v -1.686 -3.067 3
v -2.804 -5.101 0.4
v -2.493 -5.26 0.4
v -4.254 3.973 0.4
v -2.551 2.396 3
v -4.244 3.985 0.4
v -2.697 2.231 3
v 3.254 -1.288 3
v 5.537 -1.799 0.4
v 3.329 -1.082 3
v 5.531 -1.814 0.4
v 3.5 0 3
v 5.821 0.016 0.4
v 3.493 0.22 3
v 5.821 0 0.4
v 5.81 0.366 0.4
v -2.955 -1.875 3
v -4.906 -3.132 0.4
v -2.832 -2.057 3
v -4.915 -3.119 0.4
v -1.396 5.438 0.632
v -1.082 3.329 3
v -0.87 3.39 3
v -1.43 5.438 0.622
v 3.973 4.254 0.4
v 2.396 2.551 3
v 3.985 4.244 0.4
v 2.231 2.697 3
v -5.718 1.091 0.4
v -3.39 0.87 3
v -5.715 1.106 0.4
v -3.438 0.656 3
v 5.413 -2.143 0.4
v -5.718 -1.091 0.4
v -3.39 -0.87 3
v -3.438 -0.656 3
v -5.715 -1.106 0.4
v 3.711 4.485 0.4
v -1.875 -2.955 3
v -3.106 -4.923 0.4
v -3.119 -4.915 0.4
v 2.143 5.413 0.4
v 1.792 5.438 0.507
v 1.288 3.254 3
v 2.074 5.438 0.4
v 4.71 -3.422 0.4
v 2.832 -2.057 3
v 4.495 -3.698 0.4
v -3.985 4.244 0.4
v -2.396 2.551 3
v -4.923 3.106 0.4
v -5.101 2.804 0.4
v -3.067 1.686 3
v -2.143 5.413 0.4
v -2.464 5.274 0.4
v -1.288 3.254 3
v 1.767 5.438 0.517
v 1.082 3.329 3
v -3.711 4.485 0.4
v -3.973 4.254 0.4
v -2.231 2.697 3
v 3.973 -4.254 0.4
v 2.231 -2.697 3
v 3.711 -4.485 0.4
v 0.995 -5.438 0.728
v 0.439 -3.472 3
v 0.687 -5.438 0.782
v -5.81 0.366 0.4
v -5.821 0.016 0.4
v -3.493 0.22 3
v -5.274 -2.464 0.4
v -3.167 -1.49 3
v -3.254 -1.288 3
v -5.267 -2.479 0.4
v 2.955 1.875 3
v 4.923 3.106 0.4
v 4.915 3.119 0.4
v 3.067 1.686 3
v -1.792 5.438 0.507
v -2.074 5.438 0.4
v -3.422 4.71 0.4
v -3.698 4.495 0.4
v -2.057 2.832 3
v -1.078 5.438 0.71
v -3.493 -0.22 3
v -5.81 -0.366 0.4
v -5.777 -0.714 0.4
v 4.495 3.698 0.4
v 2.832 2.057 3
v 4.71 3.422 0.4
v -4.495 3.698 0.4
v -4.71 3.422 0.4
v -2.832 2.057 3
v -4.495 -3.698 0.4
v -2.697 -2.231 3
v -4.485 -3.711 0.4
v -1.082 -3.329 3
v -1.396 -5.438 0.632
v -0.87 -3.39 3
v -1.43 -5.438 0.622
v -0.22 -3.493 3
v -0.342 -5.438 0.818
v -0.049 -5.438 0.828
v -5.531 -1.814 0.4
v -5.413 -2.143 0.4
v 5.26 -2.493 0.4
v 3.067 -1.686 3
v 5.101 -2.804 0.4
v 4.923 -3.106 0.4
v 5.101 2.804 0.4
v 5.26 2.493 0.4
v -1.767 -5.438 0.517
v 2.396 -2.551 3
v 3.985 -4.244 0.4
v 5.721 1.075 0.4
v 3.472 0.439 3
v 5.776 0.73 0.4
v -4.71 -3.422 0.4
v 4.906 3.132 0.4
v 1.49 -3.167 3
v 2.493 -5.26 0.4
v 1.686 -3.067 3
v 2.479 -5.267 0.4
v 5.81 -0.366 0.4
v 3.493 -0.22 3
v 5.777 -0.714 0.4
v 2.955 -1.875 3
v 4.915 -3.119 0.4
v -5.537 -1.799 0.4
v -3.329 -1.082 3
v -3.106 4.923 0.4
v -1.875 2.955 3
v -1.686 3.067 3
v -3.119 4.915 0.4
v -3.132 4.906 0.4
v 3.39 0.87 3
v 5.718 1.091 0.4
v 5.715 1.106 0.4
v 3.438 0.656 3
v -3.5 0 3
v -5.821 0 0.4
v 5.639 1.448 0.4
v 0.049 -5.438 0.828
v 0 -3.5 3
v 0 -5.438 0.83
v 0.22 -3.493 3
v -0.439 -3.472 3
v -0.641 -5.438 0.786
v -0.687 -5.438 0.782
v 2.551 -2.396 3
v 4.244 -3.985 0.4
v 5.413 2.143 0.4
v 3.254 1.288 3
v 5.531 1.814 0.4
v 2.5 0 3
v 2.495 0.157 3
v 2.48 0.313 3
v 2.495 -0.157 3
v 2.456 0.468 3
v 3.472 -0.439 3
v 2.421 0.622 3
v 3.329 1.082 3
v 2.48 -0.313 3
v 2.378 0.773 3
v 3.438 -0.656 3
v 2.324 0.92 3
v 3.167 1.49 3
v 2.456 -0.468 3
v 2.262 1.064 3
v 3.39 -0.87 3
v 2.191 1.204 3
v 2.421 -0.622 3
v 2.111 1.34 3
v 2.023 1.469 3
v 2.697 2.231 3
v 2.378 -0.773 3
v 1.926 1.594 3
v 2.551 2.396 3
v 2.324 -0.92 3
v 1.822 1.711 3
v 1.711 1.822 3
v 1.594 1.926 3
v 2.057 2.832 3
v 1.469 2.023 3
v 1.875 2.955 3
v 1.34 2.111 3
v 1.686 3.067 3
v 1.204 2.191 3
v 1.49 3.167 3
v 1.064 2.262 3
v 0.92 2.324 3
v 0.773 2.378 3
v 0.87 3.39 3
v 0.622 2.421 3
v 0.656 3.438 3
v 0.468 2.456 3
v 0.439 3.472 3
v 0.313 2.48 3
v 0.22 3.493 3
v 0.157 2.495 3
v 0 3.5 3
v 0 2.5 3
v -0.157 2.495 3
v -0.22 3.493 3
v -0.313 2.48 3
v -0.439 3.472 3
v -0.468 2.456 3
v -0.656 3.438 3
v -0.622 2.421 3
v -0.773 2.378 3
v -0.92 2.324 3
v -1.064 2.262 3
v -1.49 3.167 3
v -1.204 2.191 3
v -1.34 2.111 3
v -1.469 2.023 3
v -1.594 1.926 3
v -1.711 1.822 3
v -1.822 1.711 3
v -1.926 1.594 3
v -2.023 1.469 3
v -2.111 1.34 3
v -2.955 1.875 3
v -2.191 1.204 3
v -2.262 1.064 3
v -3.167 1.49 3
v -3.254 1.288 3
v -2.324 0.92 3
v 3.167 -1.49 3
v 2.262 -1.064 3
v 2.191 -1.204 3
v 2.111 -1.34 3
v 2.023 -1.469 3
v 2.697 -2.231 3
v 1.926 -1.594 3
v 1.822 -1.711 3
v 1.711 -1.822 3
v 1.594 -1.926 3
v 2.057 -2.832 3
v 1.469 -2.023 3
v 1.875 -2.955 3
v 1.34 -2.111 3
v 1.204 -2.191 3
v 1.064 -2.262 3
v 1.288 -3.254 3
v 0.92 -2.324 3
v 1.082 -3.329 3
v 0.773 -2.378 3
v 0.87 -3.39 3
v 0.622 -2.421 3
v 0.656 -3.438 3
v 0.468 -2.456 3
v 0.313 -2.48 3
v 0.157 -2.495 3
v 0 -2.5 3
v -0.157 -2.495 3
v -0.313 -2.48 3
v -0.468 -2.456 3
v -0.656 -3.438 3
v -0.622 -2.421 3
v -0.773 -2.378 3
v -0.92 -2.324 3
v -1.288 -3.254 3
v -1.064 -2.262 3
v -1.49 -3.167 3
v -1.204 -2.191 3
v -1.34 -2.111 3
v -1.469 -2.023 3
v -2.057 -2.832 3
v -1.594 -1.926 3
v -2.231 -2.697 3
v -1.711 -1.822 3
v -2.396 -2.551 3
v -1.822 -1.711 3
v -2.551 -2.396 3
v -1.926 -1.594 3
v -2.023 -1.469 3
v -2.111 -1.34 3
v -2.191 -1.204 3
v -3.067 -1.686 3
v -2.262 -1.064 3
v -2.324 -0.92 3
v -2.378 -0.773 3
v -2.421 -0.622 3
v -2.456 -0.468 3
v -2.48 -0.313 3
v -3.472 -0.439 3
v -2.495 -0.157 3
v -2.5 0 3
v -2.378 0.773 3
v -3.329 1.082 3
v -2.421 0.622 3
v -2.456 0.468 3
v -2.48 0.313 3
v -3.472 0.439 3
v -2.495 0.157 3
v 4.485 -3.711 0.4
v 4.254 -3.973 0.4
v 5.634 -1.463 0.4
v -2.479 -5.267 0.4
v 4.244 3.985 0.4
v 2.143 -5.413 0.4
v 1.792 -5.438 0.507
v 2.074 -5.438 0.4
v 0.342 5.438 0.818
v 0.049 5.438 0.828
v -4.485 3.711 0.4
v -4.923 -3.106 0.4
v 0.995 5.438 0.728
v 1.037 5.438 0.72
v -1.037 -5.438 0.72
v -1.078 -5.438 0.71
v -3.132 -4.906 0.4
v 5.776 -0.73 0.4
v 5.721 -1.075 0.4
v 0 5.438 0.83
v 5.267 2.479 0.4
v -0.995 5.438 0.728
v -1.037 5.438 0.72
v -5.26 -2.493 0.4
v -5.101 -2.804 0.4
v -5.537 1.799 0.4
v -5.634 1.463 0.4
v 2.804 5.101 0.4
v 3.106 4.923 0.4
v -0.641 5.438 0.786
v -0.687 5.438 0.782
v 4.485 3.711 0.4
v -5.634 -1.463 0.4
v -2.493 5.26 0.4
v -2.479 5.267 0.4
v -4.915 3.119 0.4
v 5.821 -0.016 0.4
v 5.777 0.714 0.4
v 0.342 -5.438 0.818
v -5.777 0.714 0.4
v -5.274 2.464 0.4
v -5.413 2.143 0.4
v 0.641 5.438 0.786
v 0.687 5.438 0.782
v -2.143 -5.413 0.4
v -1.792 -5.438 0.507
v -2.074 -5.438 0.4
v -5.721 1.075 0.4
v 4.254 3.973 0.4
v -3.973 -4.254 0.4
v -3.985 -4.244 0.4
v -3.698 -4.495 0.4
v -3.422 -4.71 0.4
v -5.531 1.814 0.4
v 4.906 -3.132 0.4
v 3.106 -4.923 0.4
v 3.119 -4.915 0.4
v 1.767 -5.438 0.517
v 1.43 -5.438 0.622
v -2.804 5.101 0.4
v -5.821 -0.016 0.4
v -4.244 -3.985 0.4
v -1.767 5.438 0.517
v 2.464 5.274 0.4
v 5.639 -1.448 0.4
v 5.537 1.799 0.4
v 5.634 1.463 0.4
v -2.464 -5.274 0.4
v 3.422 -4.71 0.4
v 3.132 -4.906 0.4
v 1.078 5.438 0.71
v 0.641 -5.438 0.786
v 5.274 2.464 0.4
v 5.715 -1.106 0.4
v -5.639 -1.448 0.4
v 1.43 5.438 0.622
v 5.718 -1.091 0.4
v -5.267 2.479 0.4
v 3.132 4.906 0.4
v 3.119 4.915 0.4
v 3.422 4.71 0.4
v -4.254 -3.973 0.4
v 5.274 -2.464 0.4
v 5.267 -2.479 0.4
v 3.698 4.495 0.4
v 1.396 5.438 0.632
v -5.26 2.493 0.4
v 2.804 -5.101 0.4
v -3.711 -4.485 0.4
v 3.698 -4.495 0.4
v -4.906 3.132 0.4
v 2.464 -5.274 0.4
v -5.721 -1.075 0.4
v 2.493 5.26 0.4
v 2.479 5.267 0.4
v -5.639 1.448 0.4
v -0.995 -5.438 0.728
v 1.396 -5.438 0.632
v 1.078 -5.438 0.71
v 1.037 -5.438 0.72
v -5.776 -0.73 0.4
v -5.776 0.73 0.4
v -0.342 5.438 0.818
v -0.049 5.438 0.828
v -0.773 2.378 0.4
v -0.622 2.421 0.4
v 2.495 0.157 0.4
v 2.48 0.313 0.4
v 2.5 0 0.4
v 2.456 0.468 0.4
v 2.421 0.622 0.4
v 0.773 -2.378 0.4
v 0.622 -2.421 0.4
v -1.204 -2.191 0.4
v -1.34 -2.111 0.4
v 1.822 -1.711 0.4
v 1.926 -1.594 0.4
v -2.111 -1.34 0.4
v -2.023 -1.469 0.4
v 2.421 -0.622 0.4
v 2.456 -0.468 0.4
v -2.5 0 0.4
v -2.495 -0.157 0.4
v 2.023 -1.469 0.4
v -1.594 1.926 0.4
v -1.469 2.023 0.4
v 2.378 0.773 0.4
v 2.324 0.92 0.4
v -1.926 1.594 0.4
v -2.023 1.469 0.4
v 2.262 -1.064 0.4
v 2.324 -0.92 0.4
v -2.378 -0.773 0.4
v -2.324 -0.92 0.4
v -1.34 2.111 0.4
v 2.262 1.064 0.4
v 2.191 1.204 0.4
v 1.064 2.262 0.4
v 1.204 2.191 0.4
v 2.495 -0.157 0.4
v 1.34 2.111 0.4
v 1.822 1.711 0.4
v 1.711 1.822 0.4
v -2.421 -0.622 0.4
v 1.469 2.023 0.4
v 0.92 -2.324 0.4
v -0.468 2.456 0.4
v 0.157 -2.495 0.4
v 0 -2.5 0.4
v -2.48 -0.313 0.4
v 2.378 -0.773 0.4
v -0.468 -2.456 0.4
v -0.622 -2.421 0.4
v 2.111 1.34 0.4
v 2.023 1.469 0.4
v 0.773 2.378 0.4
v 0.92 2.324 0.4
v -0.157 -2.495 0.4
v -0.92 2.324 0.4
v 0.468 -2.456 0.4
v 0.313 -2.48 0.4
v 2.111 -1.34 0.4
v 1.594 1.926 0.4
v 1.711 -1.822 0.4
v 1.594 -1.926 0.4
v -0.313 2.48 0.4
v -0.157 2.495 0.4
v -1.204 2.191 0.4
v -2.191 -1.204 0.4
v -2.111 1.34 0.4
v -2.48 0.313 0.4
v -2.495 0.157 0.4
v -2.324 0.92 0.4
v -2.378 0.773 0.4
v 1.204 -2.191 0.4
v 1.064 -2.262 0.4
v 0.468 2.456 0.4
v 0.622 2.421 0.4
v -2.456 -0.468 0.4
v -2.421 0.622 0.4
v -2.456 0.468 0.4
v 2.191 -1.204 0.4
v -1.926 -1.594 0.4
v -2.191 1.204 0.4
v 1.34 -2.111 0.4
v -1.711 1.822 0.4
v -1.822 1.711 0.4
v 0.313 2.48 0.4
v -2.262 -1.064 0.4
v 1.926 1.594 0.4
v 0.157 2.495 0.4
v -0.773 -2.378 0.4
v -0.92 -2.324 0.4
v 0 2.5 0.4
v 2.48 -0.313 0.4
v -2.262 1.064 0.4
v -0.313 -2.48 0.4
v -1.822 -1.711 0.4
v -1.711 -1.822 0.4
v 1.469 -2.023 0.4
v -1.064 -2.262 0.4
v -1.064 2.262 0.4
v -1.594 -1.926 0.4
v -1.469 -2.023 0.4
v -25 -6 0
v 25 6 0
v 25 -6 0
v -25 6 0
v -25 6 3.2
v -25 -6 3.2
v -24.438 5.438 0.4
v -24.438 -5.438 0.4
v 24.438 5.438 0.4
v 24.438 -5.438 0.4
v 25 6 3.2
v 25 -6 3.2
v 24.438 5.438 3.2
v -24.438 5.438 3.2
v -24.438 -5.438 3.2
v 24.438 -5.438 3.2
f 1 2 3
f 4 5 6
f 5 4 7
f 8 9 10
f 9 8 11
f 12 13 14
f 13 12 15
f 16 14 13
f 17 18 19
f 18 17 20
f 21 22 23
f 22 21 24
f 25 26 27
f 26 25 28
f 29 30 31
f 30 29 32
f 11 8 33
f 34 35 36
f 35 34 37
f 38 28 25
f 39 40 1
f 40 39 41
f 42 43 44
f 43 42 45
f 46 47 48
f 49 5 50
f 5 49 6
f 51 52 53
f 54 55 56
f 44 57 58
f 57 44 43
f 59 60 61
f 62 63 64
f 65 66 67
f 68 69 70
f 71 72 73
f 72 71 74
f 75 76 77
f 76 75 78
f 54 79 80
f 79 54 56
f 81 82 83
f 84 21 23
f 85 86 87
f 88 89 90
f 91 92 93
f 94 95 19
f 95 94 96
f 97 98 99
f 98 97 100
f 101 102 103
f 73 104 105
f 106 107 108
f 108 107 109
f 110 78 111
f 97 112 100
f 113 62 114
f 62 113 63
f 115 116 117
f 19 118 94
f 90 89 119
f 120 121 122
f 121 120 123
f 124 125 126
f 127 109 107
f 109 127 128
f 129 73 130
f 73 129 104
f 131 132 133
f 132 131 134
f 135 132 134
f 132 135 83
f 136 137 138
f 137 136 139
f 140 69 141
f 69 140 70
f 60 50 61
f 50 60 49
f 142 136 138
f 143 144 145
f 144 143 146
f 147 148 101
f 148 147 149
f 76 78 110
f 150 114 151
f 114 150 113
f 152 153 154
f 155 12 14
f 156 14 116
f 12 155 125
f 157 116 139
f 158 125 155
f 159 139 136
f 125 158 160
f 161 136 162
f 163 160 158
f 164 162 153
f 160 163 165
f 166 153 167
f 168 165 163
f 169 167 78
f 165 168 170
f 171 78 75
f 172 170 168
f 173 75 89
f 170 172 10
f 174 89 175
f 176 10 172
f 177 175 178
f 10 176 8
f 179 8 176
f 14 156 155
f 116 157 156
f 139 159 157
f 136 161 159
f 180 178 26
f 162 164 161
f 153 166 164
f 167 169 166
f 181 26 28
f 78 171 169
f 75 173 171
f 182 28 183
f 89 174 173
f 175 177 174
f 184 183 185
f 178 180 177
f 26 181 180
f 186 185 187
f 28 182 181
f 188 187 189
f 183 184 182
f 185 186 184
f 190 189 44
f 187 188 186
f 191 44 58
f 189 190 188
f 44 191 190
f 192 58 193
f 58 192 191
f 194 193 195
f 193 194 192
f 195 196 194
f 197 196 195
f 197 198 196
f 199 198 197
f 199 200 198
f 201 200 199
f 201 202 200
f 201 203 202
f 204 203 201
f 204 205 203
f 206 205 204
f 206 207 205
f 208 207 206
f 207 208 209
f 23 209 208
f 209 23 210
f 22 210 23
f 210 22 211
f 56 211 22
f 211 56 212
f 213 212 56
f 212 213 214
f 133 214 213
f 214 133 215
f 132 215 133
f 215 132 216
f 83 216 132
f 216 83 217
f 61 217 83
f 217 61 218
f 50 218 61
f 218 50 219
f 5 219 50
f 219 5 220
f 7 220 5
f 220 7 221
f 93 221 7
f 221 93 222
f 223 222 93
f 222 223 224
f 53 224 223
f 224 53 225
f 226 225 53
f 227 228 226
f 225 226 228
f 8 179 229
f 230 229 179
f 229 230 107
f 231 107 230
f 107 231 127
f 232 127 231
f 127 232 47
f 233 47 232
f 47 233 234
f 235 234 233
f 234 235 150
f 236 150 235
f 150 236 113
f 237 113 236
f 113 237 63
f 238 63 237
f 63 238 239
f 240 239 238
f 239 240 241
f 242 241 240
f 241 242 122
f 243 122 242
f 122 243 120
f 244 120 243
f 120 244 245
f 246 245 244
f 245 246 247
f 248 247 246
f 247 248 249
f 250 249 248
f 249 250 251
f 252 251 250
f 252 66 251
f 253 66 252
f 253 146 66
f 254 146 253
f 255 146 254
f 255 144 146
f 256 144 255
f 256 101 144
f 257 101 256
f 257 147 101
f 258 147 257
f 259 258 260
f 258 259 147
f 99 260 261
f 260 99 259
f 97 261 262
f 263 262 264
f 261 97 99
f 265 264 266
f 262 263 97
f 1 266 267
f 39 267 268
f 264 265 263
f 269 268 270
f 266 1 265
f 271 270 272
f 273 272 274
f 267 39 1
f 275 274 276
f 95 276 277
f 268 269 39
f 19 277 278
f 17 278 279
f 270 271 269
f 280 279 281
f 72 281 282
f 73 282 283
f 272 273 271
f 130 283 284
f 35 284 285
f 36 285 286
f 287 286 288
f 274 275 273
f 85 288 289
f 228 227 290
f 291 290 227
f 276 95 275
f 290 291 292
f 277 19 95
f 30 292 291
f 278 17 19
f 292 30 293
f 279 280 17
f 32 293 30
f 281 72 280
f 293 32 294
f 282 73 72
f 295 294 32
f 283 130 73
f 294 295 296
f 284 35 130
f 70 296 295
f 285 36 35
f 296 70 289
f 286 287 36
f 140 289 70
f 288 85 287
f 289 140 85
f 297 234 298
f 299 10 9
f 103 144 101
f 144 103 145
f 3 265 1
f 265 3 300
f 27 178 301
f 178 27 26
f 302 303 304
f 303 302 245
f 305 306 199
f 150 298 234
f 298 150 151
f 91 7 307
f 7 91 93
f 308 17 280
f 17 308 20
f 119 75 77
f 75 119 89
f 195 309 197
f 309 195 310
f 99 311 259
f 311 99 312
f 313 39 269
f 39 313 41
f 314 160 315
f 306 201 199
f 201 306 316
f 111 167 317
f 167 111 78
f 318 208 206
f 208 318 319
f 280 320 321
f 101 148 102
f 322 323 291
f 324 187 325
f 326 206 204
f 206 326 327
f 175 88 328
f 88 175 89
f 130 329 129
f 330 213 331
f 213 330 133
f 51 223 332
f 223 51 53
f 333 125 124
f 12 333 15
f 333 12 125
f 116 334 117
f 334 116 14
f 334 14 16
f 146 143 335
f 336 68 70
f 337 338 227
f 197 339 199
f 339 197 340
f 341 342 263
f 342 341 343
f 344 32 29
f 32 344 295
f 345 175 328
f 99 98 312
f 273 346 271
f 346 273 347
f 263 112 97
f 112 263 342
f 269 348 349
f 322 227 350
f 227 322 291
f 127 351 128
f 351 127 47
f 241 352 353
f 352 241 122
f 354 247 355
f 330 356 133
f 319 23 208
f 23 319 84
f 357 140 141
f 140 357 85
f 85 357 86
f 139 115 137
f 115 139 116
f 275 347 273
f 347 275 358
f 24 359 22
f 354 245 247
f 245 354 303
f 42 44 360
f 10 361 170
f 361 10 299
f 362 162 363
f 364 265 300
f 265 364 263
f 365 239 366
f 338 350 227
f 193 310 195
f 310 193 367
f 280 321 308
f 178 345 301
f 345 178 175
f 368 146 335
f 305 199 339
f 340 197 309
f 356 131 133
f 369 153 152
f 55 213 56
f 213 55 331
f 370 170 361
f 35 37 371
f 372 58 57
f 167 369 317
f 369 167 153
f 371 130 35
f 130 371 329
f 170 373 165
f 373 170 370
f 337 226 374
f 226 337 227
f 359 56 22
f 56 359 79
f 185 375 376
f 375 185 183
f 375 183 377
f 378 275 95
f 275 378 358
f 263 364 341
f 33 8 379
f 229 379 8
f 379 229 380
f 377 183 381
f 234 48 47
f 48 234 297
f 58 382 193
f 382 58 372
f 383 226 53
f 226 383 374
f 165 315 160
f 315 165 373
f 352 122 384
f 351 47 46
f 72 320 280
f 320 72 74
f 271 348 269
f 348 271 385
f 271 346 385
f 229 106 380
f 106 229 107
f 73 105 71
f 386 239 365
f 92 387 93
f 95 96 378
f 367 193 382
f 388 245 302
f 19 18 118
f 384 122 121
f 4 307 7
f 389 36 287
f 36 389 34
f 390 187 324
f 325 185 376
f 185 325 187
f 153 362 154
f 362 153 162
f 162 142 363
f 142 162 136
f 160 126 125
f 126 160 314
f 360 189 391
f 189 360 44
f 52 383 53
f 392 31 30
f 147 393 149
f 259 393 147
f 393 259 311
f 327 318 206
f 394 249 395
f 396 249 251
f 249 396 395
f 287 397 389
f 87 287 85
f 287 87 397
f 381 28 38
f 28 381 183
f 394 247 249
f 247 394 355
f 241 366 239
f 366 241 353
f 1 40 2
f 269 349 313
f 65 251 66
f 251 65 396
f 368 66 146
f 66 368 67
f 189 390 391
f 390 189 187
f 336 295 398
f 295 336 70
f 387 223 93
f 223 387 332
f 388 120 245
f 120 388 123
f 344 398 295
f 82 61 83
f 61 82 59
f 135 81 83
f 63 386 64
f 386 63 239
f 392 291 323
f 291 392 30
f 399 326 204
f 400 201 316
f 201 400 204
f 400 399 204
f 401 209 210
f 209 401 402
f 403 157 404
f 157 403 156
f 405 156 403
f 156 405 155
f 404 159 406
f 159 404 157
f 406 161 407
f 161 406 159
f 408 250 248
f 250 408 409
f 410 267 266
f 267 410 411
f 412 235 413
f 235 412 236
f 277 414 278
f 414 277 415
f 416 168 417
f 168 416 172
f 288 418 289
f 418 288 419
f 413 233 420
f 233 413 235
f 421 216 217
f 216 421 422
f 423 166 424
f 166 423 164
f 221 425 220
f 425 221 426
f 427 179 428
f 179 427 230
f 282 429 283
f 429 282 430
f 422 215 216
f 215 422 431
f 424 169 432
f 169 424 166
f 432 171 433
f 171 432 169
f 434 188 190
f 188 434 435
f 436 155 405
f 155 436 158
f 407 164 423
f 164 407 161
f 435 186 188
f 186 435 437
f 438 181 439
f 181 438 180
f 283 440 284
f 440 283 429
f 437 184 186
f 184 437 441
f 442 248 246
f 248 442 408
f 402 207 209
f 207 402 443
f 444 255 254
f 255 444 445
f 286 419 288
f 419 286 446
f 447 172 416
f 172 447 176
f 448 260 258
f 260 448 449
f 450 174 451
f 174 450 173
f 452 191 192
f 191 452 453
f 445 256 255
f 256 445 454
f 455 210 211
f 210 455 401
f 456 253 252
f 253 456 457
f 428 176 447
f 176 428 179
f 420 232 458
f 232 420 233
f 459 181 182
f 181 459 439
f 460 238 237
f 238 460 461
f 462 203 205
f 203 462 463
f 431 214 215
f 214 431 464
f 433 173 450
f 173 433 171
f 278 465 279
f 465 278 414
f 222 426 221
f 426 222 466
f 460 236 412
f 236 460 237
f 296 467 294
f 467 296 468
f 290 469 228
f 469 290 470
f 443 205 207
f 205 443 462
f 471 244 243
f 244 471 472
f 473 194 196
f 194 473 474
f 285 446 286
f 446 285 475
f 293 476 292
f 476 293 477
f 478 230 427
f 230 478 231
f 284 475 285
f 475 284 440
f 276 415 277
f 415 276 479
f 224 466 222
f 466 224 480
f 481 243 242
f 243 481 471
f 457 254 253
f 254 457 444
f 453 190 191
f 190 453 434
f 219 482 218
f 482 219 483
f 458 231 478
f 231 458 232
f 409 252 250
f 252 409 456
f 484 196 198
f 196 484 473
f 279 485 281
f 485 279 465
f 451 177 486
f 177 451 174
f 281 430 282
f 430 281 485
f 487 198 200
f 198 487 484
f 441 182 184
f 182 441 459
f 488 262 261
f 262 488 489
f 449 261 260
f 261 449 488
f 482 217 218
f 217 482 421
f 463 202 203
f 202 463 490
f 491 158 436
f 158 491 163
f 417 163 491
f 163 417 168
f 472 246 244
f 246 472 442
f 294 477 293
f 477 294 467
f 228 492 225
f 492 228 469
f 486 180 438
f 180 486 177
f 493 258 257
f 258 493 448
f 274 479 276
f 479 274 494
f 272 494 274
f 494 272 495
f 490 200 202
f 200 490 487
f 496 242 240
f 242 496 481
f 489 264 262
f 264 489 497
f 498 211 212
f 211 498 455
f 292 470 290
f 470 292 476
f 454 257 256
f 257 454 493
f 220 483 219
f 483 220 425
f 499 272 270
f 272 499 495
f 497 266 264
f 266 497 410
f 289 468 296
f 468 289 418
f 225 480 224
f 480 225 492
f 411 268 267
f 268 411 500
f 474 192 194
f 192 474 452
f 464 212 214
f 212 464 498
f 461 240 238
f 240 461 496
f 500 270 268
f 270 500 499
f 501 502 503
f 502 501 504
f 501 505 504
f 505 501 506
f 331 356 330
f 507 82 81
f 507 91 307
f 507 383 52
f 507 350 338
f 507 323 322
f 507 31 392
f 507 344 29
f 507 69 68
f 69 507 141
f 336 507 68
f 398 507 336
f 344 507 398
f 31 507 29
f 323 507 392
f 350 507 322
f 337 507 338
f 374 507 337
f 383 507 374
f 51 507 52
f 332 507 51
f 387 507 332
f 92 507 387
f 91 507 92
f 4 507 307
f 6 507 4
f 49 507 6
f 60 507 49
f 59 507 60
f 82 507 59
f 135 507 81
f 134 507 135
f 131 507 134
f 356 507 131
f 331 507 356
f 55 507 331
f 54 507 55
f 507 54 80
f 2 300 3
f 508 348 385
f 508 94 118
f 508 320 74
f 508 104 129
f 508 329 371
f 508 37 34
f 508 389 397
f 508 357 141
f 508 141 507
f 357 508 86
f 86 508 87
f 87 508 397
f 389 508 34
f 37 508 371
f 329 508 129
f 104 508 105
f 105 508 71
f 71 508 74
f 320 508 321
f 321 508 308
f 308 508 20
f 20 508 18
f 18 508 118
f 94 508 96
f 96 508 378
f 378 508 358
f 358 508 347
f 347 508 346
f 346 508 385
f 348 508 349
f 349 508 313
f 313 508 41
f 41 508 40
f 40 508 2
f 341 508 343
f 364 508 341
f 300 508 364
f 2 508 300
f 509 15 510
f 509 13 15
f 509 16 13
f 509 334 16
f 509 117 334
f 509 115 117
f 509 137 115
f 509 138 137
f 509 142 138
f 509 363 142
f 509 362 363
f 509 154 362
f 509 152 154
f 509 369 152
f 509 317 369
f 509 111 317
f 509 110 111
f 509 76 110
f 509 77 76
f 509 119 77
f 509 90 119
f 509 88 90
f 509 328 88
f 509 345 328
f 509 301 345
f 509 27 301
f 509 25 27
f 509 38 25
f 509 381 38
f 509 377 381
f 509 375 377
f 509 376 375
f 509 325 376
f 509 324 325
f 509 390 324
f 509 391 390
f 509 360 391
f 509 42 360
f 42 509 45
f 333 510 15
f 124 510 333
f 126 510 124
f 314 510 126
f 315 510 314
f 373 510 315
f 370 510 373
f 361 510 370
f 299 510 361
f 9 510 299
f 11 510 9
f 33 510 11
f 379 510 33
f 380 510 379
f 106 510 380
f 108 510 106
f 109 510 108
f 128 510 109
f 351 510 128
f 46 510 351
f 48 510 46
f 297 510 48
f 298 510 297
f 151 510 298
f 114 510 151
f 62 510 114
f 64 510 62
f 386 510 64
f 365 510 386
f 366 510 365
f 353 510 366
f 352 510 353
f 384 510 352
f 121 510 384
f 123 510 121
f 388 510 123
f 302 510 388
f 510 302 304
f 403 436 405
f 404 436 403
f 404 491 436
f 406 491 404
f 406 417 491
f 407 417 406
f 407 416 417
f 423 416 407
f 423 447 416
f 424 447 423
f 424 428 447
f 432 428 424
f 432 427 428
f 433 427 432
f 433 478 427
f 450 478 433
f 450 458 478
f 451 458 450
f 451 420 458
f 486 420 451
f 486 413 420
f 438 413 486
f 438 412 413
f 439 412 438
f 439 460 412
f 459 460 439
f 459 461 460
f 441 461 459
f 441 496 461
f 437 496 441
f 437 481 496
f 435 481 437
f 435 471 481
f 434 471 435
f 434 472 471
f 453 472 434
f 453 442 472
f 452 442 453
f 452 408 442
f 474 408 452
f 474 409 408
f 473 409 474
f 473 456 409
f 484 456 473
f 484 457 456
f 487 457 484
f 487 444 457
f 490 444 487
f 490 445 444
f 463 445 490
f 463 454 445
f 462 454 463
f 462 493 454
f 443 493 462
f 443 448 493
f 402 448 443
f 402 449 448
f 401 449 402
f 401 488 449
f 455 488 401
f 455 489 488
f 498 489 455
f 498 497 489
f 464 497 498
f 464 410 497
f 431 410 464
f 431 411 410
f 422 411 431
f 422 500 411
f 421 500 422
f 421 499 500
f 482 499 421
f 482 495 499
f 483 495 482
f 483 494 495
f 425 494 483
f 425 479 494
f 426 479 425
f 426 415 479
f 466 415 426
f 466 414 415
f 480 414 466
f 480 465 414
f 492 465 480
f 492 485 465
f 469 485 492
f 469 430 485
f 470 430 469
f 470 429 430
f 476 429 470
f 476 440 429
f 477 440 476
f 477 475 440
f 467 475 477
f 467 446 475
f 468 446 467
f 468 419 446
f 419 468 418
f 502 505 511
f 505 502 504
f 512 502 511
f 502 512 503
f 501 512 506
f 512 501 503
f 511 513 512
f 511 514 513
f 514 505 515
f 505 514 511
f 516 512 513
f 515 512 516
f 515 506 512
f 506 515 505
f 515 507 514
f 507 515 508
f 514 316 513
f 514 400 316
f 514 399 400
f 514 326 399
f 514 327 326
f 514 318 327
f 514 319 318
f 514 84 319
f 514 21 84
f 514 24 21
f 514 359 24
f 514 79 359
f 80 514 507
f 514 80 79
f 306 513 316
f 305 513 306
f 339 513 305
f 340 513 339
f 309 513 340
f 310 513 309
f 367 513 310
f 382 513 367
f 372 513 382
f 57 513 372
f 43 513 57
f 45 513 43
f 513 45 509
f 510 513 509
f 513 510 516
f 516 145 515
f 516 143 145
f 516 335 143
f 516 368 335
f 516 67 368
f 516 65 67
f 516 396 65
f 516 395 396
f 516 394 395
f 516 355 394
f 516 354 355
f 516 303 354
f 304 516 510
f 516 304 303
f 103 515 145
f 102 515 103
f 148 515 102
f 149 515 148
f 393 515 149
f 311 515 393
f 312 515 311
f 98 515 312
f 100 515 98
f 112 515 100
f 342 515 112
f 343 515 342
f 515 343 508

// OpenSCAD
// Parametric model of dymo compatible magnetic notes.
// Originally designed for notes to indicate material and nozzle type on 3D-printers but nothing stops them from begin used elsewhere.

/*[ Misc variables ]*/
// Render resolution
resolution = 100;

// Enter the length of the dymo printed note here. [mm]
noteLength = 50;


/*[ Magnet dimensions ]*/
// Enter the diameter of the magnet here. [mm]
magnetDiameter = 5.0;

// Enter the thickness of the magnet here. [mm]
magnetThickness = 2.8;


/*[ Slicer and printer setup ]*/
// Enter your printed layer-height here. [mm]
layerHeight = 0.2; //

// Enter the linewidth of your slicing profile here. [mm]
wallThickness = 0.45;

// (Advanced) Enter your infill/perimeter overlap value here. [%]
overlap = 25;
wallThicknessComp = wallThickness * ((100+overlap)/100);


linear_extrude(height = layerHeight*2) {
    square([noteLength, 12], center = true);
}

translate([0, 0, layerHeight*2]){
    linear_extrude(height = magnetThickness) {
        difference() {
            square([noteLength, 12], center = true); square([noteLength - wallThicknessComp*2, 12 - wallThicknessComp*2], center = true);
        }
    }
}

translate([0, 0, layerHeight + magnetThickness/2]) {
    difference() {
        cylinder(h = magnetThickness , r1 = magnetDiameter + 1, r2 = magnetDiameter/2 + 1, center = true); cylinder(h = magnetThickness*2 , r = magnetDiameter/2, center = true);
    }
}

$fn = resolution;
